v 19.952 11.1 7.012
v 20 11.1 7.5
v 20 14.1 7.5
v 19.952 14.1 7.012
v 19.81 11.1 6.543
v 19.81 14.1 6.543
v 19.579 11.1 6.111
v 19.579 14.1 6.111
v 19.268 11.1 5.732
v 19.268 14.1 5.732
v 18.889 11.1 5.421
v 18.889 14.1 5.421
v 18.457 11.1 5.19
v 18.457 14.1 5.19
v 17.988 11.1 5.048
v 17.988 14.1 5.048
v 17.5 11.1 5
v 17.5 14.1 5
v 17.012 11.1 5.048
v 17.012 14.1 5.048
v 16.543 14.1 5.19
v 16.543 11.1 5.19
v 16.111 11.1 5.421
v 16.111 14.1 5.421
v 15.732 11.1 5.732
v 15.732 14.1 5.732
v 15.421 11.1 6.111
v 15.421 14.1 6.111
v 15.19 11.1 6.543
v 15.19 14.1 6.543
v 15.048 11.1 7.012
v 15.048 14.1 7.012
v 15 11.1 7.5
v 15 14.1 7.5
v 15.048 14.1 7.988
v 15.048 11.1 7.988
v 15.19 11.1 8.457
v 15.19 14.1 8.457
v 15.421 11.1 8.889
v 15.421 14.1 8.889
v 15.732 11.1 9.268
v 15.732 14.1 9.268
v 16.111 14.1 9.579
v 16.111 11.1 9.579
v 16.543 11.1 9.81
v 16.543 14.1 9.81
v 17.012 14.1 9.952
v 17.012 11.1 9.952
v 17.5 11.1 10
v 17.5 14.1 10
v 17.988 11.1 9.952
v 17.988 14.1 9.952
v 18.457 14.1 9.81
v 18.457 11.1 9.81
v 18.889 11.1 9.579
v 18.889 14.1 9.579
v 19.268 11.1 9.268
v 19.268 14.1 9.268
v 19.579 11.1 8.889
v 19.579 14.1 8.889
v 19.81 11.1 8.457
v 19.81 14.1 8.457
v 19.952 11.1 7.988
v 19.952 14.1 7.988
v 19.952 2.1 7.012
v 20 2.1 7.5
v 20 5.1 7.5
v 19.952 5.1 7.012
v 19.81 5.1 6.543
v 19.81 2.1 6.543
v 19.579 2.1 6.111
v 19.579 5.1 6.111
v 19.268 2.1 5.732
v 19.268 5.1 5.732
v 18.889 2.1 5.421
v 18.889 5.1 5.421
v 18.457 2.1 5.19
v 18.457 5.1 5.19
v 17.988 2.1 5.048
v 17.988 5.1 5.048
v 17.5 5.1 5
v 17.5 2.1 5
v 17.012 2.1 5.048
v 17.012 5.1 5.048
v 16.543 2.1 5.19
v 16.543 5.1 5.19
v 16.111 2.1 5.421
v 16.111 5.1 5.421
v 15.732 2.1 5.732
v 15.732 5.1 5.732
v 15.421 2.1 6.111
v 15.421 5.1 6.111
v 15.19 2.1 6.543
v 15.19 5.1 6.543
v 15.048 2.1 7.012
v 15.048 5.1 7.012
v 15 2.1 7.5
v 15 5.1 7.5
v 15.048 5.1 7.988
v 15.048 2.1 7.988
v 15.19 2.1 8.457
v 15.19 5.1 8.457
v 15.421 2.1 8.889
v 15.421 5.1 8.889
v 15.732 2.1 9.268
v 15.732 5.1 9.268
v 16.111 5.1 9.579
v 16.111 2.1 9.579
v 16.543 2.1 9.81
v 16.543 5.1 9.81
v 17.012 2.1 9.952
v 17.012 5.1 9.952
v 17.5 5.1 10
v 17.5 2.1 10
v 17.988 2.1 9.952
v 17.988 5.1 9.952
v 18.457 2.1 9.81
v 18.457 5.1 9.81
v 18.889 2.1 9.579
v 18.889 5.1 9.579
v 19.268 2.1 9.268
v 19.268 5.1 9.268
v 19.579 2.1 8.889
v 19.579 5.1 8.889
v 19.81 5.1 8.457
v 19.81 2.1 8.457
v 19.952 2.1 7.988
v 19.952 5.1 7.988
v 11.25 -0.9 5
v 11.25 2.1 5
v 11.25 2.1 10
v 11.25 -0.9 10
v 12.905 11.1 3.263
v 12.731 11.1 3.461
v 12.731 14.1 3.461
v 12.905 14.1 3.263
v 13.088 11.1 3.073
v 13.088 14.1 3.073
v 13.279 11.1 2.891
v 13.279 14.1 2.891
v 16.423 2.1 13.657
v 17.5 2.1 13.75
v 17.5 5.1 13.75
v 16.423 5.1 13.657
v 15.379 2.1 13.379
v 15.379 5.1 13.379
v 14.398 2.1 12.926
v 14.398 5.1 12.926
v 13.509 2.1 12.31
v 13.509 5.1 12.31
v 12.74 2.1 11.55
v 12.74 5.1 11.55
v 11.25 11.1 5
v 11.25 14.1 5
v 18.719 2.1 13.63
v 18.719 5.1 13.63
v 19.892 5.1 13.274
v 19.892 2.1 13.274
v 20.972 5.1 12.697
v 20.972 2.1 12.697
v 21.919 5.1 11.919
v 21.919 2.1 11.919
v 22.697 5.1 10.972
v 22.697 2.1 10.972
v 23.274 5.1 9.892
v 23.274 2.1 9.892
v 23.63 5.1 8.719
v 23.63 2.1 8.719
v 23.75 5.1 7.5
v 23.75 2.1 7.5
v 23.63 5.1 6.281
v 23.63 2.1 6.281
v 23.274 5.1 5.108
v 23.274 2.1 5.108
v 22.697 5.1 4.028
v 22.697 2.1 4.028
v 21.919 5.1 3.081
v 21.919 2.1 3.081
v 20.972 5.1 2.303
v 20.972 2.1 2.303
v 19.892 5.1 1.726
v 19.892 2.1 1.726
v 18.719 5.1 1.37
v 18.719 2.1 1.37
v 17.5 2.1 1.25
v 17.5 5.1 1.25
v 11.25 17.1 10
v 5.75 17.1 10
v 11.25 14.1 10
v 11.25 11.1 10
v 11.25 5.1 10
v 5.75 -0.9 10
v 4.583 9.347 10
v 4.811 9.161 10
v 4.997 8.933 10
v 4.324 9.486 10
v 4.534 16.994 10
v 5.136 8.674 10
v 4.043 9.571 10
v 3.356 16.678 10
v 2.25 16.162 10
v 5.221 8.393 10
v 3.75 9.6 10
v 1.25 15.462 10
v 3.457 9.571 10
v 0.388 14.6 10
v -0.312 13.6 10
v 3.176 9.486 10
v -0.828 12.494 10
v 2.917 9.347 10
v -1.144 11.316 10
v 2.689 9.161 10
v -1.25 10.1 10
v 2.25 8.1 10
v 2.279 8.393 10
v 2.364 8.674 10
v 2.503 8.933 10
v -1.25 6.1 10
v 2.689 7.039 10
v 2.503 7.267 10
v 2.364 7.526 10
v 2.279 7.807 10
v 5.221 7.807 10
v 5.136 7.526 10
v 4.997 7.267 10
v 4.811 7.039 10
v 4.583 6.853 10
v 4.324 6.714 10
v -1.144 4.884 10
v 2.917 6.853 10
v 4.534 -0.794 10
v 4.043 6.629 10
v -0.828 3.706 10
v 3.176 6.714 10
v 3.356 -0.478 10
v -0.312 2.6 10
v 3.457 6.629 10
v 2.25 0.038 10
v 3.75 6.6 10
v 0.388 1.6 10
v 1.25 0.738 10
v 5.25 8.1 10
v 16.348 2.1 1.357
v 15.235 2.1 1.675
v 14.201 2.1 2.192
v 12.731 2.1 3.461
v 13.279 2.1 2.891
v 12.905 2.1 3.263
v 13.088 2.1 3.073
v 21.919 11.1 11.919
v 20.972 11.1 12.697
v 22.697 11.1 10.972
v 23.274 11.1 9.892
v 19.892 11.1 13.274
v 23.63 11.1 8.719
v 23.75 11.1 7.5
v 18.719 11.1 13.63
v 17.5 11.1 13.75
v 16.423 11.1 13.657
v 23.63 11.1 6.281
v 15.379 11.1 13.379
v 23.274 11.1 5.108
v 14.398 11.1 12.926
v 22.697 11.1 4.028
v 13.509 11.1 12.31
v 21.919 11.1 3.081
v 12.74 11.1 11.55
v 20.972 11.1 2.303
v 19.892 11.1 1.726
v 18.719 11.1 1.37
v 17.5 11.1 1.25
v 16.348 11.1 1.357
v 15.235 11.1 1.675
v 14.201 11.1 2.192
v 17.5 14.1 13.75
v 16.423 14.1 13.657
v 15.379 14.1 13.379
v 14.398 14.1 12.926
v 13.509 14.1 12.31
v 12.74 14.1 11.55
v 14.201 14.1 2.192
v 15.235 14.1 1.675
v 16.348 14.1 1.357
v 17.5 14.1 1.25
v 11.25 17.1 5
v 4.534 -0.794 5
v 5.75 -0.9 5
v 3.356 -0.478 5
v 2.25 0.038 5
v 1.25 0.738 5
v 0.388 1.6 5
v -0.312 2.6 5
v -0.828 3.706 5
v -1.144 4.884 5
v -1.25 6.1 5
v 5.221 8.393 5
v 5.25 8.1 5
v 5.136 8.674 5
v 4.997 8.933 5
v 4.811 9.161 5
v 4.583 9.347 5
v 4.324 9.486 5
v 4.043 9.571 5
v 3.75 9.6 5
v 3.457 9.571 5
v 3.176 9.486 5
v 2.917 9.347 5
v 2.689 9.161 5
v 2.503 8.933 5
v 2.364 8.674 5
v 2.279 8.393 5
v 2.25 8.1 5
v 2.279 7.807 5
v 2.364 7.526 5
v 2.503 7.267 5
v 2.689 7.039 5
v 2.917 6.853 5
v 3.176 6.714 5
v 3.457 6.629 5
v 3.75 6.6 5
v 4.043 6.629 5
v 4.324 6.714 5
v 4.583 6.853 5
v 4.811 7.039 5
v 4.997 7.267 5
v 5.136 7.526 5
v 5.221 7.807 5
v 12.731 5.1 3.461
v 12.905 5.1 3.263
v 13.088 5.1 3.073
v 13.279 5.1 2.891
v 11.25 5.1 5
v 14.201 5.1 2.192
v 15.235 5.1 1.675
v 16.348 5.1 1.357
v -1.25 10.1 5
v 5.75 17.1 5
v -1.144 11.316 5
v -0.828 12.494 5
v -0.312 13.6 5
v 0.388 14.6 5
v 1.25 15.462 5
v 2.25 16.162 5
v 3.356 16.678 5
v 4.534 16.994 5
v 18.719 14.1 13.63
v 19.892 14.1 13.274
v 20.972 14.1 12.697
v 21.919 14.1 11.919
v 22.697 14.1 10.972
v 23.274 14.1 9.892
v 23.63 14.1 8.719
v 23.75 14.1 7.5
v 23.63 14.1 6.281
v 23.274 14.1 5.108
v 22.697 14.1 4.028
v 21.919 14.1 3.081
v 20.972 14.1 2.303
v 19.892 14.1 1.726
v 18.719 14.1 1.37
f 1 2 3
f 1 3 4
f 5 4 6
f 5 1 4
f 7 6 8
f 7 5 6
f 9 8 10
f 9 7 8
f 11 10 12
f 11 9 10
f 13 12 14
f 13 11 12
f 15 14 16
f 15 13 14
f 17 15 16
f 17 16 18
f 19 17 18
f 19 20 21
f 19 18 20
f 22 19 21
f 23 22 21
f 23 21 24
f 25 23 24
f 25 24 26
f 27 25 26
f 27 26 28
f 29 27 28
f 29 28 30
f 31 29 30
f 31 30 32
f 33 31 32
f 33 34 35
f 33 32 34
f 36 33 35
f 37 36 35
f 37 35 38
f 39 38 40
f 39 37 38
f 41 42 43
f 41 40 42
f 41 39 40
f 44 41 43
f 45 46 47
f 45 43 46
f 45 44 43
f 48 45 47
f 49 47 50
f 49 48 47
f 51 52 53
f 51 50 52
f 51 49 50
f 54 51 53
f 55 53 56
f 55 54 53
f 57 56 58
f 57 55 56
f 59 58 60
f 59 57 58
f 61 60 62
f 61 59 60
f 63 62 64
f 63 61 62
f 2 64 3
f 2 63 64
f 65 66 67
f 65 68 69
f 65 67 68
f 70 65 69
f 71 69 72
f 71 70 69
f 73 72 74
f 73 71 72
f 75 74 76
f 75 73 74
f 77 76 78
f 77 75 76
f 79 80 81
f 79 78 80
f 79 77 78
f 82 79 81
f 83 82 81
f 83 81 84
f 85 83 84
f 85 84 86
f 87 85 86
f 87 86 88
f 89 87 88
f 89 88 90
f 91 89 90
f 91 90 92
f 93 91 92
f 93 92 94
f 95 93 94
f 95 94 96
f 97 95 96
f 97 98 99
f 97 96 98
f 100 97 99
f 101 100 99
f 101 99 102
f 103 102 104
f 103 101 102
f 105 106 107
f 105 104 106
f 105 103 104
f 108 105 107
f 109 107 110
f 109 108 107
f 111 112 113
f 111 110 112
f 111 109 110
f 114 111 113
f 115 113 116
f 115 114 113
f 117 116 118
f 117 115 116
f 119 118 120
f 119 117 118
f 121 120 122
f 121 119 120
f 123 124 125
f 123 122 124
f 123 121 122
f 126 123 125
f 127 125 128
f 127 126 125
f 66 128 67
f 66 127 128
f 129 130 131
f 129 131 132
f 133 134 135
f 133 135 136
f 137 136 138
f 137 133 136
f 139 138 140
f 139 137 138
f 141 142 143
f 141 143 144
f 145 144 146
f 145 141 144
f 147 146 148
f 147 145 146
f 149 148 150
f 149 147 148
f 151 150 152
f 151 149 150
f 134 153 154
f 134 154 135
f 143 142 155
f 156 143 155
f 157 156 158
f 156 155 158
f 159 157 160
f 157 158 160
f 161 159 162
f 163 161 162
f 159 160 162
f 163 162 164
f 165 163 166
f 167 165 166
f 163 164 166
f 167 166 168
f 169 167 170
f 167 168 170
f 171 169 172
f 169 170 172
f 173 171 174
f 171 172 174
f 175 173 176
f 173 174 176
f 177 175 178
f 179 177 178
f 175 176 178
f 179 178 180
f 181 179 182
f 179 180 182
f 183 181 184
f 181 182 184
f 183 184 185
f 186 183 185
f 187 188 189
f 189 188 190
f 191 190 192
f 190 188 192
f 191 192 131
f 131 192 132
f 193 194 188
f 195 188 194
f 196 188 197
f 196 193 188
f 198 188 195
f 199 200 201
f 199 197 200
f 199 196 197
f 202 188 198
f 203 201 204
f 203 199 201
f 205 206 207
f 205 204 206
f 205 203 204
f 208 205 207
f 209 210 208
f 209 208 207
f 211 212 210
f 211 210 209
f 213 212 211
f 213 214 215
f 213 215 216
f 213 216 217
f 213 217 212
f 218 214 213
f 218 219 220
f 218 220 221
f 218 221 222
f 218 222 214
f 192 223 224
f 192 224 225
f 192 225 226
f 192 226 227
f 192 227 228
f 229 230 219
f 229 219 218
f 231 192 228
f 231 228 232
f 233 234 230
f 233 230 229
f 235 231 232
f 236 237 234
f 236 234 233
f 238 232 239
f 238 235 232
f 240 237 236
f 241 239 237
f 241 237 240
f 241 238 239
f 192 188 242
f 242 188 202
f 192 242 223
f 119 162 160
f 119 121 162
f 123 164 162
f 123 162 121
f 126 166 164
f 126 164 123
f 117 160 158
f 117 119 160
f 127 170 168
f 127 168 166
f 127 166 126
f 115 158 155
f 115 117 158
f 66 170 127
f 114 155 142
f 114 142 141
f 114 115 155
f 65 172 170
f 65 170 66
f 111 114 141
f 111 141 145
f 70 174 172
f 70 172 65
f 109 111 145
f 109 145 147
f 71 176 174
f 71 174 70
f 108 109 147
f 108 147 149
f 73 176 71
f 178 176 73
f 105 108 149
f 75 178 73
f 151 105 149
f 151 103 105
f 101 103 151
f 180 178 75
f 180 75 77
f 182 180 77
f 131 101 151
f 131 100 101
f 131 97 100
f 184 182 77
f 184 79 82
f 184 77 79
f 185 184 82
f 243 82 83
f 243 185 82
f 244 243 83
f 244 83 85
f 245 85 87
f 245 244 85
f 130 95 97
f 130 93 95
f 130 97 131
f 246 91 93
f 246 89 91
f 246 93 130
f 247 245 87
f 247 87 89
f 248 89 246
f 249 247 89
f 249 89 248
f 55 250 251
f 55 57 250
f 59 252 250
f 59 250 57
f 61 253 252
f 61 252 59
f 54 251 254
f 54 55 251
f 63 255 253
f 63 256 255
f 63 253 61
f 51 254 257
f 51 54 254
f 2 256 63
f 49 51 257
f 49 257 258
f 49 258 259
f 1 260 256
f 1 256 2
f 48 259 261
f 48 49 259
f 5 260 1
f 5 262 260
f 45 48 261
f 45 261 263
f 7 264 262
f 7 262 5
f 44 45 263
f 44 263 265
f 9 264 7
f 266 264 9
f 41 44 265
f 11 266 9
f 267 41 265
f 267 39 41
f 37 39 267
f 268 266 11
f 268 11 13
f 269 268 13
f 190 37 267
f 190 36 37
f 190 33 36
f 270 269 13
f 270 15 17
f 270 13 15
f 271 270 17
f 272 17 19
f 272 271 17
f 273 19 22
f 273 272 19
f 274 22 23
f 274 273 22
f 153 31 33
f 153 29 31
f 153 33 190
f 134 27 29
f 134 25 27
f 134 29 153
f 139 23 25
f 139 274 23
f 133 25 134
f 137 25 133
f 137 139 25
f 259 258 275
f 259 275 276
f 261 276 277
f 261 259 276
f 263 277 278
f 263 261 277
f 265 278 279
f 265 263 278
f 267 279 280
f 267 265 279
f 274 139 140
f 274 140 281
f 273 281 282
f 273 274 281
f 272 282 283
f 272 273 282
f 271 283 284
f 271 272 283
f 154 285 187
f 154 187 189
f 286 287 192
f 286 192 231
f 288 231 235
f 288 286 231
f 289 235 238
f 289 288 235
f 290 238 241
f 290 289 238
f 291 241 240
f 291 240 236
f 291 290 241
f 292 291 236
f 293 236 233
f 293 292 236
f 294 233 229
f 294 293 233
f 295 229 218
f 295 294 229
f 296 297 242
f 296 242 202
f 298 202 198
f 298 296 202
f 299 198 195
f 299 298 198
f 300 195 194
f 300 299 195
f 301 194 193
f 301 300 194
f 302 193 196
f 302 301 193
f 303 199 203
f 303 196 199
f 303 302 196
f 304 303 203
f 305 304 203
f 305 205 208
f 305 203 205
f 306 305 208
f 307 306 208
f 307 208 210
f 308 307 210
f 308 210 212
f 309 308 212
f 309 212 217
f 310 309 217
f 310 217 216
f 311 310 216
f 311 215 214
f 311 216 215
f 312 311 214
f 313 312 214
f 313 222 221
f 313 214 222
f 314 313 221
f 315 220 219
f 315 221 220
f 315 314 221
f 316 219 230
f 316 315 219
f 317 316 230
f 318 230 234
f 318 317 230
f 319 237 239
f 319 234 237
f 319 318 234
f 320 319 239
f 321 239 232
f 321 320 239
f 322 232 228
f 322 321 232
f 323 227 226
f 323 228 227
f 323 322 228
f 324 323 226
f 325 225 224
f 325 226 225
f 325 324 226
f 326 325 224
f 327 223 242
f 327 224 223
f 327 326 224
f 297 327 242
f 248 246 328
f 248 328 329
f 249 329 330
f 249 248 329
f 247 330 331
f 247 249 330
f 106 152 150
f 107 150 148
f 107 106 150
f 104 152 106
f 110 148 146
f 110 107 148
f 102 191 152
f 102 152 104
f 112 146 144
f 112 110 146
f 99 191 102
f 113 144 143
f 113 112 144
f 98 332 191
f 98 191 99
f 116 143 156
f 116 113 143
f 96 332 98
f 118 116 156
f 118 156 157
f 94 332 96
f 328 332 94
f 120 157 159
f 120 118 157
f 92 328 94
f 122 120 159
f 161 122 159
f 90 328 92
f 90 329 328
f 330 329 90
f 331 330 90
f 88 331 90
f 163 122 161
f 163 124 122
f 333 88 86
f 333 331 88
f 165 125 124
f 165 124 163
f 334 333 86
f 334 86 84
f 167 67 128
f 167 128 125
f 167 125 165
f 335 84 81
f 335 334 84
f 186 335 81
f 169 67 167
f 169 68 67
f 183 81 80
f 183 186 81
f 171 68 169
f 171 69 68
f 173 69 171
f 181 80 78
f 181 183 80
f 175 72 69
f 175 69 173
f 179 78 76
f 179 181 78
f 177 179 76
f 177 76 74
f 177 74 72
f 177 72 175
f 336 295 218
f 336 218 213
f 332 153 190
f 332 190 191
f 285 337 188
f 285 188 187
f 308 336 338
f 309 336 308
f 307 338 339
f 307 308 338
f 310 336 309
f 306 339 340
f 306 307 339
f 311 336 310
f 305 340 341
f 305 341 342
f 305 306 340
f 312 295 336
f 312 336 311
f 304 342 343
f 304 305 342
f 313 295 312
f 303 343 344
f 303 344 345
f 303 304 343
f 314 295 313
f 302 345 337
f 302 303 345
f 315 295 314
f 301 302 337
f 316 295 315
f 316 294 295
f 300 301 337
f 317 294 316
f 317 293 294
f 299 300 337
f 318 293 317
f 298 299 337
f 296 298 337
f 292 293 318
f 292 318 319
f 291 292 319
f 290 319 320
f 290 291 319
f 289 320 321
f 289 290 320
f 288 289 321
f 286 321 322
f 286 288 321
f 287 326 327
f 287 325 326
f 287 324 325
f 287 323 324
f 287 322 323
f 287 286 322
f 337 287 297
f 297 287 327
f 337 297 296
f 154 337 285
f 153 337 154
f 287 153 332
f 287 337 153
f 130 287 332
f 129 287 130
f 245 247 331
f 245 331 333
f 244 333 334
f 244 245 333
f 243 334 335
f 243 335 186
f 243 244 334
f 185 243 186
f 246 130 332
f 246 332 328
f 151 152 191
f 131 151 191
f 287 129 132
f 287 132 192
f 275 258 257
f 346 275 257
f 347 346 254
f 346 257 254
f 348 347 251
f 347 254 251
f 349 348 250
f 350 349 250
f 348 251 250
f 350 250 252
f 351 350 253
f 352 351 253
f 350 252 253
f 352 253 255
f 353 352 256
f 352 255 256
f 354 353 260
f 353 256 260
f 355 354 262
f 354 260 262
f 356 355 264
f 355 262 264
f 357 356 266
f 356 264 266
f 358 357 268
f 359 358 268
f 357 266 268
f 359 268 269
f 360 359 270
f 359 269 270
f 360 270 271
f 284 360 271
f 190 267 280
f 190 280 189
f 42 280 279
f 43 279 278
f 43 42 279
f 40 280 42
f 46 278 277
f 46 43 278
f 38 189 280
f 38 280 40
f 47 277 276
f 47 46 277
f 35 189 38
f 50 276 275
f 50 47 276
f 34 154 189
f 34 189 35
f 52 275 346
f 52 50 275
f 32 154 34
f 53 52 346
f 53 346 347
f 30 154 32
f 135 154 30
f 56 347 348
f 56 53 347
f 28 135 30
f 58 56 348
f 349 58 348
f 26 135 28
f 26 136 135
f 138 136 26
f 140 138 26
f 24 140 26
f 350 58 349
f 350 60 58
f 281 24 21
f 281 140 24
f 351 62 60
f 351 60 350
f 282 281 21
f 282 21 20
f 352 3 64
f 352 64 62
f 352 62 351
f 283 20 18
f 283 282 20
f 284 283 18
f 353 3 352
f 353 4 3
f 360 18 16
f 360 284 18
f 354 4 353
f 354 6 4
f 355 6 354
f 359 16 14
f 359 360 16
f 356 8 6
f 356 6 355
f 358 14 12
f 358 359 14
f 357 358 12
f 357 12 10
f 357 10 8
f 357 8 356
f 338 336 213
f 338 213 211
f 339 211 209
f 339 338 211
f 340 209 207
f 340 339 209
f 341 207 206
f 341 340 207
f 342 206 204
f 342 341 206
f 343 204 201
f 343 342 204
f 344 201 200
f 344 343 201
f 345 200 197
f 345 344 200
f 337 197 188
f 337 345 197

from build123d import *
from build123d.topology import SkipClean

# Parameters (mm, degrees)
CROQUIS1_R              = 1.5
SALIENTE_EXTRUIR1_DEPTH = 15
CROQUIS2_R              = 2.5
CORTAR_EXTRUIR1_DEPTH   = 20
CORTAR_EXTRUIR2_START   = -26
CROQUIS4_W              = 5.5
CROQUIS4_H              = 5
CORTAR_EXTRUIR2_DEPTH   = 26


with BuildPart() as part:
    # Croquis1 → Saliente-Extruir1 (new body)
    with BuildSketch(Plane.XY):
        with BuildLine():
            Line((11.25, 17.1), (11.25, 14.1))
            Line((11.25, 14.1), (23.75, 14.1))
            Line((23.75, 14.1), (23.75, 11.1))
            Line((23.75, 11.1), (11.25, 11.1))
            Line((11.25, 11.1), (11.25, 5.1))
            Line((11.25, 5.1), (23.75, 5.1))
            Line((23.75, 5.1), (23.75, 2.1))
            Line((23.75, 2.1), (11.25, 2.1))
            Line((11.25, 2.1), (11.25, -0.9))
            Line((11.25, -0.9), (5.75, -0.9))
            ThreePointArc((5.75, -0.9), (0.800252532, 1.150252532), (-1.25, 6.1))
            Line((-1.25, 6.1), (-1.25, 10.1))
            ThreePointArc((-1.25, 10.1), (0.800252532, 15.049747468), (5.75, 17.1))
            Line((5.75, 17.1), (11.25, 17.1))
        make_face()
        with Locations((3.75, 8.1)):
            Circle(CROQUIS1_R, mode=Mode.SUBTRACT)
    extrude(amount=SALIENTE_EXTRUIR1_DEPTH)

    # Croquis2 → Cortar-Extruir1 (cut)
    with BuildSketch(Plane(origin=(0, 0, 0), x_dir=(1, 0, 0), z_dir=(0, 1, 0))):
        with Locations((17.5, -7.5)):
            Circle(CROQUIS2_R)
        with BuildLine():
            Line((17.5, -1.25), (11.25, 0))
            Line((11.25, 0), (11.126279301, 1.868603497))
            Line((11.126279301, 1.868603497), (29.663453957, 1.868603497))
            Line((29.663453957, 1.868603497), (29.663453957, -17.961269996))
            Line((29.663453957, -17.961269996), (11.25, -17.961269996))
            Line((11.25, -17.961269996), (11.25, -15))
            Line((11.25, -15), (17.5, -13.75))
            ThreePointArc((17.5, -13.75), (23.75, -7.5), (17.5, -1.25))
        make_face()
    extrude(amount=CORTAR_EXTRUIR1_DEPTH, mode=Mode.SUBTRACT)

    # Croquis4 → Cortar-Extruir2 (cut)
    with SkipClean():  # the faces are left unmerged after this step: merging them gives an invalid solid
        with BuildSketch(Plane(origin=(0, 17.1, 0), x_dir=(1, 0, 0), z_dir=(0, 1, 0)).offset(CORTAR_EXTRUIR2_START)):
            with BuildLine():
                Line((-4.389645589, -5), (5.75, -5))
                Line((5.75, -5), (5.75, 0))
                Line((5.75, 0), (11.25, 0))
                Line((11.25, 0), (11.25, -5))
                Line((11.25, -5), (12.730653795, -3.460713334))
                ThreePointArc((12.730653795, -3.460713334), (12.995627449, -3.167203221), (13.278631189, -2.891036411))
                ThreePointArc((13.278631189, -2.891036411), (15.2354385, -1.674687887), (17.5, -1.25))
                Line((17.5, -1.25), (17.5, 1.887707064))
                Line((17.5, 1.887707064), (-4.389645589, 1.887707064))
                Line((-4.389645589, 1.887707064), (-4.389645589, -5))
            make_face()
            with Locations((8.5, -2.5)):
                Rectangle(CROQUIS4_W, CROQUIS4_H)
            with BuildLine():
                Line((5.75, -10), (-4.389645589, -10))
                Line((-4.389645589, -10), (-4.389645589, -16.45653889))
                Line((-4.389645589, -16.45653889), (17.5, -16.45653889))
                Line((17.5, -16.45653889), (17.5, -13.75))
                ThreePointArc((17.5, -13.75), (14.878268112, -13.173536984), (12.740162296, -11.550487011))
                Line((12.740162296, -11.550487011), (11.25, -10))
                Line((11.25, -10), (11.25, -15))
                Line((11.25, -15), (5.75, -15))
                Line((5.75, -15), (5.75, -10))
            make_face()
            with Locations((8.5, -12.5)):
                Rectangle(CROQUIS4_W, CROQUIS4_H)
        extrude(amount=CORTAR_EXTRUIR2_DEPTH, mode=Mode.SUBTRACT)


solid = part.part
